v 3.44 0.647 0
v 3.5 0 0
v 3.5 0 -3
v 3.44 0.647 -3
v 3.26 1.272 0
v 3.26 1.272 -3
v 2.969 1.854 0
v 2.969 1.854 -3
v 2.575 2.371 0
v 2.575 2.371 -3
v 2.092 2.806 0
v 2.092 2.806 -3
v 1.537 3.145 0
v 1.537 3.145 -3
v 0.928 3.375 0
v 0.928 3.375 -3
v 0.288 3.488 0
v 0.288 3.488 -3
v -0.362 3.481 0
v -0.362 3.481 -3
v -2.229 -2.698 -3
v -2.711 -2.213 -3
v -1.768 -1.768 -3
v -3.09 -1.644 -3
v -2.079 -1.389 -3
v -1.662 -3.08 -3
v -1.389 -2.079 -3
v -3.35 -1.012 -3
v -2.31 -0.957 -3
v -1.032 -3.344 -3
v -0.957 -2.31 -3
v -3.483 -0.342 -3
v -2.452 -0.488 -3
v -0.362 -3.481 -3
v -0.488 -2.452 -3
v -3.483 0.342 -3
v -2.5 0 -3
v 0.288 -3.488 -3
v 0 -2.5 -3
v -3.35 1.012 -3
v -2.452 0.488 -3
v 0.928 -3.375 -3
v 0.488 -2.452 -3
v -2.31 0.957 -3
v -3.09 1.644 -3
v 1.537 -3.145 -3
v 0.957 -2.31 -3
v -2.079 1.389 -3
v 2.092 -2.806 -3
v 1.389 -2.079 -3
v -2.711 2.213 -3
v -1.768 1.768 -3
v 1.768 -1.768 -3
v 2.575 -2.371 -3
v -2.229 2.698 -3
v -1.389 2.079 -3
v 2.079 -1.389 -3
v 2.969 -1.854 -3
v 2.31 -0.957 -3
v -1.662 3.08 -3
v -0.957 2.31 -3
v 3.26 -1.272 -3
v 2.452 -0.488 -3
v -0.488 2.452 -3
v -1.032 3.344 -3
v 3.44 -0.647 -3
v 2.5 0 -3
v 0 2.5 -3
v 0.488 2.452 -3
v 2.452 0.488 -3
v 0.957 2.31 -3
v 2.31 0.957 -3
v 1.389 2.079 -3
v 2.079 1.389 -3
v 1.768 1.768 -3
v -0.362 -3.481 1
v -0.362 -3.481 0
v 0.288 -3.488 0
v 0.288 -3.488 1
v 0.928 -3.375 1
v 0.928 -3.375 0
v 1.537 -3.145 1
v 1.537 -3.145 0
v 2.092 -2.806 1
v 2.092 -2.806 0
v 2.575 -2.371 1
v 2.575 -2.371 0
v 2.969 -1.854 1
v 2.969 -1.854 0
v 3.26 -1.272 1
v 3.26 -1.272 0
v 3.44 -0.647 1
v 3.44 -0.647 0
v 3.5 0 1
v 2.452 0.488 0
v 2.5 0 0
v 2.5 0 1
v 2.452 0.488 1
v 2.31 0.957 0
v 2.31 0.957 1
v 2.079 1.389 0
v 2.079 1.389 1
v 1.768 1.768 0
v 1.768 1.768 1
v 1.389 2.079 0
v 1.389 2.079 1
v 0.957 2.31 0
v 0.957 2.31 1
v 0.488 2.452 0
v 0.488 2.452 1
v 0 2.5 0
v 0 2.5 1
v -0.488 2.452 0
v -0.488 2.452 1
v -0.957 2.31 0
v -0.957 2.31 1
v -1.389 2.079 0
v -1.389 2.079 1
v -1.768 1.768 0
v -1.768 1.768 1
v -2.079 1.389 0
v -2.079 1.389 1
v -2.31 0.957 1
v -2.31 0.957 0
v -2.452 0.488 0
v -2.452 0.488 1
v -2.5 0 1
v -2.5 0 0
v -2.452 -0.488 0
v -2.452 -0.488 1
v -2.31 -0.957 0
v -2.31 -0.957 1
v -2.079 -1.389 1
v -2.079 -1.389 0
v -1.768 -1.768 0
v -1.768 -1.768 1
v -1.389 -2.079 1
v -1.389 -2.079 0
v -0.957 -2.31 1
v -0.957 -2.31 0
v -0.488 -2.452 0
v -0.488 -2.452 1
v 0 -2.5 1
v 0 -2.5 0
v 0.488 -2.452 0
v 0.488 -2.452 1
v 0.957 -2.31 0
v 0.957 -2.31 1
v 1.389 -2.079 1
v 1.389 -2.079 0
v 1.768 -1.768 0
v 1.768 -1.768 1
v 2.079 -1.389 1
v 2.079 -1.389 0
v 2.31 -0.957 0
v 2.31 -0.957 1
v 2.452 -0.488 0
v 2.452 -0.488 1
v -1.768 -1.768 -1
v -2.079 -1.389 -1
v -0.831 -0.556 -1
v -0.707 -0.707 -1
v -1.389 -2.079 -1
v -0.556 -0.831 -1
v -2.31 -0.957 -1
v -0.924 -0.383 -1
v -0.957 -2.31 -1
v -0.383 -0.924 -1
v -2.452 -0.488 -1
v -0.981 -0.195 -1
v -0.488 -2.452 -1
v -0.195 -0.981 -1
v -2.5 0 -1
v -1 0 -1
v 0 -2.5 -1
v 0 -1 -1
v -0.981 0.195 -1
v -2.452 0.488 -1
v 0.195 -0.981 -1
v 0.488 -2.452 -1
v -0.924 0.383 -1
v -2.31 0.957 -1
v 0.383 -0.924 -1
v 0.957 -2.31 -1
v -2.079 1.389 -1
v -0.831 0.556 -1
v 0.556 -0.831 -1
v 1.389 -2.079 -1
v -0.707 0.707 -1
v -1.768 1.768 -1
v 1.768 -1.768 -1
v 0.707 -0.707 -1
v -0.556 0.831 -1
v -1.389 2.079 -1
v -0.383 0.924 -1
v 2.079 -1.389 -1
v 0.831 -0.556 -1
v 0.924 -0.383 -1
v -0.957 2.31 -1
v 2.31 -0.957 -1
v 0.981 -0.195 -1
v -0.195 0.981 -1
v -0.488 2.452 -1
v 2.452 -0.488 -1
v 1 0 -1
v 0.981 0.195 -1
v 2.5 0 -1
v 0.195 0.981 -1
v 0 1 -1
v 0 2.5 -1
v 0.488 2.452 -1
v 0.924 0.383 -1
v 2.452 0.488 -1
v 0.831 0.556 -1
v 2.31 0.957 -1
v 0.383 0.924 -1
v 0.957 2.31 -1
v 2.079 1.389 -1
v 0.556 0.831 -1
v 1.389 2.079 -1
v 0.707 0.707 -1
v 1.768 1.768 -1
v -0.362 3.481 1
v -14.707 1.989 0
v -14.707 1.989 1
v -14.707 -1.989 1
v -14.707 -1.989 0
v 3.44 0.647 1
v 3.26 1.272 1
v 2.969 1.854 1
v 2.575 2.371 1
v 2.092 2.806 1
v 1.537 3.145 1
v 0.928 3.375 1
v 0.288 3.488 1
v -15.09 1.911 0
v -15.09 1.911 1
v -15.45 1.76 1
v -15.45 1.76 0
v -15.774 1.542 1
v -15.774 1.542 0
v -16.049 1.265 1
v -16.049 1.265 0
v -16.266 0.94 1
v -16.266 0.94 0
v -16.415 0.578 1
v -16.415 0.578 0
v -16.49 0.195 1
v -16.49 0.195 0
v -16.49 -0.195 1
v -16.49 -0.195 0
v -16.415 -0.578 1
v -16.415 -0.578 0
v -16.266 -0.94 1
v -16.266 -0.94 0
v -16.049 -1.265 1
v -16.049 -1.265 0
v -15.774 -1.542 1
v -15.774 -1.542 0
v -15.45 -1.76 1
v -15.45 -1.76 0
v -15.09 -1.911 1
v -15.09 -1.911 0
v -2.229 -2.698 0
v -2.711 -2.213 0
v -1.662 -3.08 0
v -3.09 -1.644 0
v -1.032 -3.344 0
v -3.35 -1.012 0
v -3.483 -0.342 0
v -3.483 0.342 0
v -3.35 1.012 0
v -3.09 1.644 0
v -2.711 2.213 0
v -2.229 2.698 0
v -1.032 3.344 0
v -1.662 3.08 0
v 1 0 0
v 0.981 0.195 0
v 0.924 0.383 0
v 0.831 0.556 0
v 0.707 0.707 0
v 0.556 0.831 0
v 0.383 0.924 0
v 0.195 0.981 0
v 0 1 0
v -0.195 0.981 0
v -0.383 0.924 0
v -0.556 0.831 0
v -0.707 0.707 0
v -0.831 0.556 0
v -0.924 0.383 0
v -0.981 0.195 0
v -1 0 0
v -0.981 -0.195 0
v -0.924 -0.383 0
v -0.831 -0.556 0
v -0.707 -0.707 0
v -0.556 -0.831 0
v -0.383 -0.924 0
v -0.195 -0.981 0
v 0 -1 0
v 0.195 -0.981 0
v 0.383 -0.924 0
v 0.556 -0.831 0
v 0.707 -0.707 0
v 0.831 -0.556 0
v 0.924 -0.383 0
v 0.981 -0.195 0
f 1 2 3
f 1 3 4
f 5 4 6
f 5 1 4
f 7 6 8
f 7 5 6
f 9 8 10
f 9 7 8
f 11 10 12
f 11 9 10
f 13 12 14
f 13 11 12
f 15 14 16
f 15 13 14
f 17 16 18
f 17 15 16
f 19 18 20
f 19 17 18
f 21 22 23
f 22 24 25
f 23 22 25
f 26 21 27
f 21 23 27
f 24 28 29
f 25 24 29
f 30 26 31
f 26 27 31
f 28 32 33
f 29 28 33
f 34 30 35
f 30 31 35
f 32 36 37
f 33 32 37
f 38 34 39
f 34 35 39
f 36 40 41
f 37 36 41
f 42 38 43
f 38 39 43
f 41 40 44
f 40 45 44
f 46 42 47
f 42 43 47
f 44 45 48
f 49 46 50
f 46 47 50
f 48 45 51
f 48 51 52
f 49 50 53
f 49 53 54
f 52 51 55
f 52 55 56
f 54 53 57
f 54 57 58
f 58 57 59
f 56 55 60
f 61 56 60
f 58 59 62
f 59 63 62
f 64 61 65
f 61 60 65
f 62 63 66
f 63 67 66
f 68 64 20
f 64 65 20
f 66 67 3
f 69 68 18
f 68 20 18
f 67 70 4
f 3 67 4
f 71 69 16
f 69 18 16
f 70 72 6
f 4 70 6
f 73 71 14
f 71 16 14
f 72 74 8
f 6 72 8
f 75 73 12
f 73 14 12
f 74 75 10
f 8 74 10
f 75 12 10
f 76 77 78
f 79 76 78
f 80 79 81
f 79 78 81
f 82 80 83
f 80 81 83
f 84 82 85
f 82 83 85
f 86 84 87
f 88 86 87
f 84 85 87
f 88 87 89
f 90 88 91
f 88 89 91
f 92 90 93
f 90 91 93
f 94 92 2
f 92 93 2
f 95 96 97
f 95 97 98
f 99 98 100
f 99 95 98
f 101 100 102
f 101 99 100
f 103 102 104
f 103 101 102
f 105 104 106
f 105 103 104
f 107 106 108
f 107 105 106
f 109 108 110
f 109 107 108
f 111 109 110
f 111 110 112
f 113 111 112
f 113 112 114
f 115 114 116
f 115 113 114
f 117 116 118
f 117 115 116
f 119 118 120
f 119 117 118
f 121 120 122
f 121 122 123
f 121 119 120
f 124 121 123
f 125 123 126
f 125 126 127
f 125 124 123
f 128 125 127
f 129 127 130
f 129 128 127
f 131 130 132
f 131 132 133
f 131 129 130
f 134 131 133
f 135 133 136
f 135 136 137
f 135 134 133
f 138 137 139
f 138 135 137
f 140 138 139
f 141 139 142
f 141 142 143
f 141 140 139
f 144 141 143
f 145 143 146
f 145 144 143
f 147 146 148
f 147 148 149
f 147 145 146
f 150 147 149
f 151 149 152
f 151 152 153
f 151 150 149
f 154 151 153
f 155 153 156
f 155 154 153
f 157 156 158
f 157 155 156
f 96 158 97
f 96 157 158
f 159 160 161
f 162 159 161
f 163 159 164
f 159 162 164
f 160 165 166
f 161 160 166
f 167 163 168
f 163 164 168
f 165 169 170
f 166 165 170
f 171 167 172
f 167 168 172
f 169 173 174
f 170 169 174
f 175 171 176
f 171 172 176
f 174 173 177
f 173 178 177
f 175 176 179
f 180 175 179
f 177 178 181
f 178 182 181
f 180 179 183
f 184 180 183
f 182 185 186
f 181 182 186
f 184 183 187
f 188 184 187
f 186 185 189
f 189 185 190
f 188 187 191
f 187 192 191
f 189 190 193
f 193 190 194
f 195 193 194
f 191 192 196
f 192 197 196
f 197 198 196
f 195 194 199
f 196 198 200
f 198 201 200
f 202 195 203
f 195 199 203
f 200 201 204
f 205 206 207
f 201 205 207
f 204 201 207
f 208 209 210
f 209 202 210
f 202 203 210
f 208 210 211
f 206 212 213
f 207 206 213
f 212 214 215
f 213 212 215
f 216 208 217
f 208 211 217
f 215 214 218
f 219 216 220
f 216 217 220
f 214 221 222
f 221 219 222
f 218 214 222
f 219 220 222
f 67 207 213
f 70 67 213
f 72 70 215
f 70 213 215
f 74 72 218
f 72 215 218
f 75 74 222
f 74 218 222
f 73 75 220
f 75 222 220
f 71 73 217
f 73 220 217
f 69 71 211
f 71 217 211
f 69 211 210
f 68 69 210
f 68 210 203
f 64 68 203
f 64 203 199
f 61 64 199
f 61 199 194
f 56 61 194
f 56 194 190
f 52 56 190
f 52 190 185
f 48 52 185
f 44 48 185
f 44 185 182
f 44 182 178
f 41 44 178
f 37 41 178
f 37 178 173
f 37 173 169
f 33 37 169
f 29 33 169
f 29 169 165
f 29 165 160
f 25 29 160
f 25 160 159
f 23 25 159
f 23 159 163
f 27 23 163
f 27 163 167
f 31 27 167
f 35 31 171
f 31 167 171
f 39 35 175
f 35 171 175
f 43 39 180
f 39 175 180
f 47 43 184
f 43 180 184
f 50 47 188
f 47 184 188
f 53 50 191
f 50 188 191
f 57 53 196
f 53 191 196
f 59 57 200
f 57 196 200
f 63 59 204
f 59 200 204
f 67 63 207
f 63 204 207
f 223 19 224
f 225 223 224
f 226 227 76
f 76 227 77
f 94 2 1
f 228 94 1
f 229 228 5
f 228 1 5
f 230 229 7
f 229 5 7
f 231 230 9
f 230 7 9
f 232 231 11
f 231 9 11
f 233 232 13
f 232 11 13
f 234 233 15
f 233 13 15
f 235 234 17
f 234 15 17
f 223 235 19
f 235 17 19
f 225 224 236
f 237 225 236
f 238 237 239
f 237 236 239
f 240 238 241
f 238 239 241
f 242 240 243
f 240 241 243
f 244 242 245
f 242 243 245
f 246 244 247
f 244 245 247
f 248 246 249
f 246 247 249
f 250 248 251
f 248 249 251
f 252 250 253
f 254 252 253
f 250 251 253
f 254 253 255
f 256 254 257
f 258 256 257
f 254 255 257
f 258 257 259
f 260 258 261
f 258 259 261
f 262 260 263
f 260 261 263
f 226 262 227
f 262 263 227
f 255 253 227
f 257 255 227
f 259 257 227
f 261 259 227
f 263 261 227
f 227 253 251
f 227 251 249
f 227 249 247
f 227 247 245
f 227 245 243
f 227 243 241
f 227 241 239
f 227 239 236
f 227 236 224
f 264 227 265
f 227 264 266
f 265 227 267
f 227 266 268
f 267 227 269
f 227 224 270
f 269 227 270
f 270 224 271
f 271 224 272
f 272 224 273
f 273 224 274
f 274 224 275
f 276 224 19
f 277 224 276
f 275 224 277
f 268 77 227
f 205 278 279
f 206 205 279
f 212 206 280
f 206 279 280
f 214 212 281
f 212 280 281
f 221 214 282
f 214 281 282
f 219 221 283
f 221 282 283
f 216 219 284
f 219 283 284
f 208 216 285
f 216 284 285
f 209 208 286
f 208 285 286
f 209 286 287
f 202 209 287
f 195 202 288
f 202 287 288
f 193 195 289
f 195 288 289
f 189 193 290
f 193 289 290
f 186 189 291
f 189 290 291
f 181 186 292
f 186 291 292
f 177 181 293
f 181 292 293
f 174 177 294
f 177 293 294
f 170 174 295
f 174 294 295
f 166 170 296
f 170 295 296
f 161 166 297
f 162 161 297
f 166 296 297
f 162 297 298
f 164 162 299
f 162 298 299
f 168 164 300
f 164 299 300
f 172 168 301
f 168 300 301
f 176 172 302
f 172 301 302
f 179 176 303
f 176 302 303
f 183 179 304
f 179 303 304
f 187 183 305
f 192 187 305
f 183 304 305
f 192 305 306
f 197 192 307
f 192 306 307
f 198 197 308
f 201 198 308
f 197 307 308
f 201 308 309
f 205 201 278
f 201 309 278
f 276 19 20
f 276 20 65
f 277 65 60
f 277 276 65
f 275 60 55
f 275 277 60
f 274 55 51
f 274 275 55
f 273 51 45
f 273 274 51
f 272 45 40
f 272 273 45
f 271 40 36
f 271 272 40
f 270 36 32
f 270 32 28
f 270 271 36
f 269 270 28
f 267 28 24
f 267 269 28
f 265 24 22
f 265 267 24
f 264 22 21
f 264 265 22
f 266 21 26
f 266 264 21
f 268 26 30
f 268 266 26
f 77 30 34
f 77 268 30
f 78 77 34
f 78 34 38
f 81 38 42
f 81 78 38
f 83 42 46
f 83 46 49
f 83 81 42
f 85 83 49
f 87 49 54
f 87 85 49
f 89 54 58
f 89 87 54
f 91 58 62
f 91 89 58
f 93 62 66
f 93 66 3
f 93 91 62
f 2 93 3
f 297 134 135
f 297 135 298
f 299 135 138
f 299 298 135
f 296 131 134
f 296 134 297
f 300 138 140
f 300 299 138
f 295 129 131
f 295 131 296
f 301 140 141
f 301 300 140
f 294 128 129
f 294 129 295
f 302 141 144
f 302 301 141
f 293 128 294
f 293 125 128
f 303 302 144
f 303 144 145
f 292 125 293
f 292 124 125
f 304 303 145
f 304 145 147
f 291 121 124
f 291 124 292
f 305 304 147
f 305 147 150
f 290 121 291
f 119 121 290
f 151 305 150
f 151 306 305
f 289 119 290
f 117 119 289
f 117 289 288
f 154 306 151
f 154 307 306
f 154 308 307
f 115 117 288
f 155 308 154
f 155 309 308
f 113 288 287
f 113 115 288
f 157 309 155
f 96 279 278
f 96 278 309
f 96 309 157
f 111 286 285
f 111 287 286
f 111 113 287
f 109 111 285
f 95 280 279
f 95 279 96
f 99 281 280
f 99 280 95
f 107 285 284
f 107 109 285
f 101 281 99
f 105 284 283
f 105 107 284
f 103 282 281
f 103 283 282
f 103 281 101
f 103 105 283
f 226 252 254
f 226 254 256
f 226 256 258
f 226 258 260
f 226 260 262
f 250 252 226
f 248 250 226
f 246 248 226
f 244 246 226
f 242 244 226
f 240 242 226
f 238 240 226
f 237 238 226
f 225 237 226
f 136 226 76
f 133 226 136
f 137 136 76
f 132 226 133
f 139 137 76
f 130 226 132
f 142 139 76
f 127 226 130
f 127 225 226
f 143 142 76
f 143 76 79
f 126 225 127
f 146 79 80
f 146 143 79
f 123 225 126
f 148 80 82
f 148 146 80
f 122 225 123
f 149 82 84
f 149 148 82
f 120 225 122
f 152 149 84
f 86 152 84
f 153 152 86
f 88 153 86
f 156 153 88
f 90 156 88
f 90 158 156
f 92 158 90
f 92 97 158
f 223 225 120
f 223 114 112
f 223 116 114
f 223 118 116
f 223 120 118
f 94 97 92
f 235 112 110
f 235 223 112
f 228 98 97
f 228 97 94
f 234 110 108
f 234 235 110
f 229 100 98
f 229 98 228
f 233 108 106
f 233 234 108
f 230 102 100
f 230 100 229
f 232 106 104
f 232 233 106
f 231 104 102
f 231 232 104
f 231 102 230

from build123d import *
from build123d import SkipClean  # not in build123d's __all__

# Parameters (mm, degrees)
F0_R     = 2.5
F1_DEPTH = 1
F2_DEPTH = 3
F0_R_2   = 1
F3_DEPTH = 1


# Not quite as in the source:
# - after a boolean that leaves OpenCascade's solid faulty, fix() repairs it


with BuildPart() as f1:
    # F0 (on Top) → F1 (new body)
    with BuildSketch(Plane.XY):
        with BuildLine():
            ThreePointArc((-12.5, 0), (-13.1609318732, 1.4855627054), (-14.7068965517, 1.9892696692))
            ThreePointArc((-14.7068965517, 1.9892696692), (-16.5, 0), (-14.7068965517, -1.9892696692))
            ThreePointArc((-14.7068965517, -1.9892696692), (-13.1609318732, -1.4855627054), (-12.5, 0))
        make_face()
        with BuildLine():
            ThreePointArc((-0.362068922, -3.4812219257), (-3.5, 7.5e-09), (-0.362068907, 3.4812219272))
            Line((-0.362068907, 3.4812219272), (-14.7068965517, 1.9892696692))
            ThreePointArc((-14.7068965517, 1.9892696692), (-13.1609318732, 1.4855627054), (-12.5, 0))
            ThreePointArc((-12.5, 0), (-13.1609318732, -1.4855627054), (-14.7068965517, -1.9892696692))
            Line((-14.7068965517, -1.9892696692), (-0.362068922, -3.4812219257))
        make_face()
        with BuildLine():
            ThreePointArc((-0.362068922, -3.4812219257), (2.3433692382, -2.5997347198), (3.5, 0))
            ThreePointArc((3.5, 0), (2.3433692438, 2.5997347148), (-0.362068907, 3.4812219272))
            ThreePointArc((-0.362068907, 3.4812219272), (-3.5, 7.5e-09), (-0.362068922, -3.4812219257))
        make_face()
        Circle(F0_R, mode=Mode.SUBTRACT)
    extrude(amount=F1_DEPTH)

    # F0 (on Top) → F2 (join)
    with BuildSketch(Plane.XY):
        with BuildLine():
            ThreePointArc((-0.362068922, -3.4812219257), (2.3433692382, -2.5997347198), (3.5, 0))
            ThreePointArc((3.5, 0), (2.3433692438, 2.5997347148), (-0.362068907, 3.4812219272))
            ThreePointArc((-0.362068907, 3.4812219272), (-3.5, 7.5e-09), (-0.362068922, -3.4812219257))
        make_face()
        Circle(F0_R, mode=Mode.SUBTRACT)
    with SkipClean():  # cleaning this boolean's faces spoils the solid; the shape is the same uncleaned
        extrude(amount=-F2_DEPTH)

    # F0 (on Top) → F3 (join)
    with BuildSketch(Plane.XY):
        Circle(F0_R)
        Circle(F0_R_2, mode=Mode.SUBTRACT)
    extrude(amount=-F3_DEPTH)

    add(f1.part.fix(), mode=Mode.REPLACE)


solid = f1.part
